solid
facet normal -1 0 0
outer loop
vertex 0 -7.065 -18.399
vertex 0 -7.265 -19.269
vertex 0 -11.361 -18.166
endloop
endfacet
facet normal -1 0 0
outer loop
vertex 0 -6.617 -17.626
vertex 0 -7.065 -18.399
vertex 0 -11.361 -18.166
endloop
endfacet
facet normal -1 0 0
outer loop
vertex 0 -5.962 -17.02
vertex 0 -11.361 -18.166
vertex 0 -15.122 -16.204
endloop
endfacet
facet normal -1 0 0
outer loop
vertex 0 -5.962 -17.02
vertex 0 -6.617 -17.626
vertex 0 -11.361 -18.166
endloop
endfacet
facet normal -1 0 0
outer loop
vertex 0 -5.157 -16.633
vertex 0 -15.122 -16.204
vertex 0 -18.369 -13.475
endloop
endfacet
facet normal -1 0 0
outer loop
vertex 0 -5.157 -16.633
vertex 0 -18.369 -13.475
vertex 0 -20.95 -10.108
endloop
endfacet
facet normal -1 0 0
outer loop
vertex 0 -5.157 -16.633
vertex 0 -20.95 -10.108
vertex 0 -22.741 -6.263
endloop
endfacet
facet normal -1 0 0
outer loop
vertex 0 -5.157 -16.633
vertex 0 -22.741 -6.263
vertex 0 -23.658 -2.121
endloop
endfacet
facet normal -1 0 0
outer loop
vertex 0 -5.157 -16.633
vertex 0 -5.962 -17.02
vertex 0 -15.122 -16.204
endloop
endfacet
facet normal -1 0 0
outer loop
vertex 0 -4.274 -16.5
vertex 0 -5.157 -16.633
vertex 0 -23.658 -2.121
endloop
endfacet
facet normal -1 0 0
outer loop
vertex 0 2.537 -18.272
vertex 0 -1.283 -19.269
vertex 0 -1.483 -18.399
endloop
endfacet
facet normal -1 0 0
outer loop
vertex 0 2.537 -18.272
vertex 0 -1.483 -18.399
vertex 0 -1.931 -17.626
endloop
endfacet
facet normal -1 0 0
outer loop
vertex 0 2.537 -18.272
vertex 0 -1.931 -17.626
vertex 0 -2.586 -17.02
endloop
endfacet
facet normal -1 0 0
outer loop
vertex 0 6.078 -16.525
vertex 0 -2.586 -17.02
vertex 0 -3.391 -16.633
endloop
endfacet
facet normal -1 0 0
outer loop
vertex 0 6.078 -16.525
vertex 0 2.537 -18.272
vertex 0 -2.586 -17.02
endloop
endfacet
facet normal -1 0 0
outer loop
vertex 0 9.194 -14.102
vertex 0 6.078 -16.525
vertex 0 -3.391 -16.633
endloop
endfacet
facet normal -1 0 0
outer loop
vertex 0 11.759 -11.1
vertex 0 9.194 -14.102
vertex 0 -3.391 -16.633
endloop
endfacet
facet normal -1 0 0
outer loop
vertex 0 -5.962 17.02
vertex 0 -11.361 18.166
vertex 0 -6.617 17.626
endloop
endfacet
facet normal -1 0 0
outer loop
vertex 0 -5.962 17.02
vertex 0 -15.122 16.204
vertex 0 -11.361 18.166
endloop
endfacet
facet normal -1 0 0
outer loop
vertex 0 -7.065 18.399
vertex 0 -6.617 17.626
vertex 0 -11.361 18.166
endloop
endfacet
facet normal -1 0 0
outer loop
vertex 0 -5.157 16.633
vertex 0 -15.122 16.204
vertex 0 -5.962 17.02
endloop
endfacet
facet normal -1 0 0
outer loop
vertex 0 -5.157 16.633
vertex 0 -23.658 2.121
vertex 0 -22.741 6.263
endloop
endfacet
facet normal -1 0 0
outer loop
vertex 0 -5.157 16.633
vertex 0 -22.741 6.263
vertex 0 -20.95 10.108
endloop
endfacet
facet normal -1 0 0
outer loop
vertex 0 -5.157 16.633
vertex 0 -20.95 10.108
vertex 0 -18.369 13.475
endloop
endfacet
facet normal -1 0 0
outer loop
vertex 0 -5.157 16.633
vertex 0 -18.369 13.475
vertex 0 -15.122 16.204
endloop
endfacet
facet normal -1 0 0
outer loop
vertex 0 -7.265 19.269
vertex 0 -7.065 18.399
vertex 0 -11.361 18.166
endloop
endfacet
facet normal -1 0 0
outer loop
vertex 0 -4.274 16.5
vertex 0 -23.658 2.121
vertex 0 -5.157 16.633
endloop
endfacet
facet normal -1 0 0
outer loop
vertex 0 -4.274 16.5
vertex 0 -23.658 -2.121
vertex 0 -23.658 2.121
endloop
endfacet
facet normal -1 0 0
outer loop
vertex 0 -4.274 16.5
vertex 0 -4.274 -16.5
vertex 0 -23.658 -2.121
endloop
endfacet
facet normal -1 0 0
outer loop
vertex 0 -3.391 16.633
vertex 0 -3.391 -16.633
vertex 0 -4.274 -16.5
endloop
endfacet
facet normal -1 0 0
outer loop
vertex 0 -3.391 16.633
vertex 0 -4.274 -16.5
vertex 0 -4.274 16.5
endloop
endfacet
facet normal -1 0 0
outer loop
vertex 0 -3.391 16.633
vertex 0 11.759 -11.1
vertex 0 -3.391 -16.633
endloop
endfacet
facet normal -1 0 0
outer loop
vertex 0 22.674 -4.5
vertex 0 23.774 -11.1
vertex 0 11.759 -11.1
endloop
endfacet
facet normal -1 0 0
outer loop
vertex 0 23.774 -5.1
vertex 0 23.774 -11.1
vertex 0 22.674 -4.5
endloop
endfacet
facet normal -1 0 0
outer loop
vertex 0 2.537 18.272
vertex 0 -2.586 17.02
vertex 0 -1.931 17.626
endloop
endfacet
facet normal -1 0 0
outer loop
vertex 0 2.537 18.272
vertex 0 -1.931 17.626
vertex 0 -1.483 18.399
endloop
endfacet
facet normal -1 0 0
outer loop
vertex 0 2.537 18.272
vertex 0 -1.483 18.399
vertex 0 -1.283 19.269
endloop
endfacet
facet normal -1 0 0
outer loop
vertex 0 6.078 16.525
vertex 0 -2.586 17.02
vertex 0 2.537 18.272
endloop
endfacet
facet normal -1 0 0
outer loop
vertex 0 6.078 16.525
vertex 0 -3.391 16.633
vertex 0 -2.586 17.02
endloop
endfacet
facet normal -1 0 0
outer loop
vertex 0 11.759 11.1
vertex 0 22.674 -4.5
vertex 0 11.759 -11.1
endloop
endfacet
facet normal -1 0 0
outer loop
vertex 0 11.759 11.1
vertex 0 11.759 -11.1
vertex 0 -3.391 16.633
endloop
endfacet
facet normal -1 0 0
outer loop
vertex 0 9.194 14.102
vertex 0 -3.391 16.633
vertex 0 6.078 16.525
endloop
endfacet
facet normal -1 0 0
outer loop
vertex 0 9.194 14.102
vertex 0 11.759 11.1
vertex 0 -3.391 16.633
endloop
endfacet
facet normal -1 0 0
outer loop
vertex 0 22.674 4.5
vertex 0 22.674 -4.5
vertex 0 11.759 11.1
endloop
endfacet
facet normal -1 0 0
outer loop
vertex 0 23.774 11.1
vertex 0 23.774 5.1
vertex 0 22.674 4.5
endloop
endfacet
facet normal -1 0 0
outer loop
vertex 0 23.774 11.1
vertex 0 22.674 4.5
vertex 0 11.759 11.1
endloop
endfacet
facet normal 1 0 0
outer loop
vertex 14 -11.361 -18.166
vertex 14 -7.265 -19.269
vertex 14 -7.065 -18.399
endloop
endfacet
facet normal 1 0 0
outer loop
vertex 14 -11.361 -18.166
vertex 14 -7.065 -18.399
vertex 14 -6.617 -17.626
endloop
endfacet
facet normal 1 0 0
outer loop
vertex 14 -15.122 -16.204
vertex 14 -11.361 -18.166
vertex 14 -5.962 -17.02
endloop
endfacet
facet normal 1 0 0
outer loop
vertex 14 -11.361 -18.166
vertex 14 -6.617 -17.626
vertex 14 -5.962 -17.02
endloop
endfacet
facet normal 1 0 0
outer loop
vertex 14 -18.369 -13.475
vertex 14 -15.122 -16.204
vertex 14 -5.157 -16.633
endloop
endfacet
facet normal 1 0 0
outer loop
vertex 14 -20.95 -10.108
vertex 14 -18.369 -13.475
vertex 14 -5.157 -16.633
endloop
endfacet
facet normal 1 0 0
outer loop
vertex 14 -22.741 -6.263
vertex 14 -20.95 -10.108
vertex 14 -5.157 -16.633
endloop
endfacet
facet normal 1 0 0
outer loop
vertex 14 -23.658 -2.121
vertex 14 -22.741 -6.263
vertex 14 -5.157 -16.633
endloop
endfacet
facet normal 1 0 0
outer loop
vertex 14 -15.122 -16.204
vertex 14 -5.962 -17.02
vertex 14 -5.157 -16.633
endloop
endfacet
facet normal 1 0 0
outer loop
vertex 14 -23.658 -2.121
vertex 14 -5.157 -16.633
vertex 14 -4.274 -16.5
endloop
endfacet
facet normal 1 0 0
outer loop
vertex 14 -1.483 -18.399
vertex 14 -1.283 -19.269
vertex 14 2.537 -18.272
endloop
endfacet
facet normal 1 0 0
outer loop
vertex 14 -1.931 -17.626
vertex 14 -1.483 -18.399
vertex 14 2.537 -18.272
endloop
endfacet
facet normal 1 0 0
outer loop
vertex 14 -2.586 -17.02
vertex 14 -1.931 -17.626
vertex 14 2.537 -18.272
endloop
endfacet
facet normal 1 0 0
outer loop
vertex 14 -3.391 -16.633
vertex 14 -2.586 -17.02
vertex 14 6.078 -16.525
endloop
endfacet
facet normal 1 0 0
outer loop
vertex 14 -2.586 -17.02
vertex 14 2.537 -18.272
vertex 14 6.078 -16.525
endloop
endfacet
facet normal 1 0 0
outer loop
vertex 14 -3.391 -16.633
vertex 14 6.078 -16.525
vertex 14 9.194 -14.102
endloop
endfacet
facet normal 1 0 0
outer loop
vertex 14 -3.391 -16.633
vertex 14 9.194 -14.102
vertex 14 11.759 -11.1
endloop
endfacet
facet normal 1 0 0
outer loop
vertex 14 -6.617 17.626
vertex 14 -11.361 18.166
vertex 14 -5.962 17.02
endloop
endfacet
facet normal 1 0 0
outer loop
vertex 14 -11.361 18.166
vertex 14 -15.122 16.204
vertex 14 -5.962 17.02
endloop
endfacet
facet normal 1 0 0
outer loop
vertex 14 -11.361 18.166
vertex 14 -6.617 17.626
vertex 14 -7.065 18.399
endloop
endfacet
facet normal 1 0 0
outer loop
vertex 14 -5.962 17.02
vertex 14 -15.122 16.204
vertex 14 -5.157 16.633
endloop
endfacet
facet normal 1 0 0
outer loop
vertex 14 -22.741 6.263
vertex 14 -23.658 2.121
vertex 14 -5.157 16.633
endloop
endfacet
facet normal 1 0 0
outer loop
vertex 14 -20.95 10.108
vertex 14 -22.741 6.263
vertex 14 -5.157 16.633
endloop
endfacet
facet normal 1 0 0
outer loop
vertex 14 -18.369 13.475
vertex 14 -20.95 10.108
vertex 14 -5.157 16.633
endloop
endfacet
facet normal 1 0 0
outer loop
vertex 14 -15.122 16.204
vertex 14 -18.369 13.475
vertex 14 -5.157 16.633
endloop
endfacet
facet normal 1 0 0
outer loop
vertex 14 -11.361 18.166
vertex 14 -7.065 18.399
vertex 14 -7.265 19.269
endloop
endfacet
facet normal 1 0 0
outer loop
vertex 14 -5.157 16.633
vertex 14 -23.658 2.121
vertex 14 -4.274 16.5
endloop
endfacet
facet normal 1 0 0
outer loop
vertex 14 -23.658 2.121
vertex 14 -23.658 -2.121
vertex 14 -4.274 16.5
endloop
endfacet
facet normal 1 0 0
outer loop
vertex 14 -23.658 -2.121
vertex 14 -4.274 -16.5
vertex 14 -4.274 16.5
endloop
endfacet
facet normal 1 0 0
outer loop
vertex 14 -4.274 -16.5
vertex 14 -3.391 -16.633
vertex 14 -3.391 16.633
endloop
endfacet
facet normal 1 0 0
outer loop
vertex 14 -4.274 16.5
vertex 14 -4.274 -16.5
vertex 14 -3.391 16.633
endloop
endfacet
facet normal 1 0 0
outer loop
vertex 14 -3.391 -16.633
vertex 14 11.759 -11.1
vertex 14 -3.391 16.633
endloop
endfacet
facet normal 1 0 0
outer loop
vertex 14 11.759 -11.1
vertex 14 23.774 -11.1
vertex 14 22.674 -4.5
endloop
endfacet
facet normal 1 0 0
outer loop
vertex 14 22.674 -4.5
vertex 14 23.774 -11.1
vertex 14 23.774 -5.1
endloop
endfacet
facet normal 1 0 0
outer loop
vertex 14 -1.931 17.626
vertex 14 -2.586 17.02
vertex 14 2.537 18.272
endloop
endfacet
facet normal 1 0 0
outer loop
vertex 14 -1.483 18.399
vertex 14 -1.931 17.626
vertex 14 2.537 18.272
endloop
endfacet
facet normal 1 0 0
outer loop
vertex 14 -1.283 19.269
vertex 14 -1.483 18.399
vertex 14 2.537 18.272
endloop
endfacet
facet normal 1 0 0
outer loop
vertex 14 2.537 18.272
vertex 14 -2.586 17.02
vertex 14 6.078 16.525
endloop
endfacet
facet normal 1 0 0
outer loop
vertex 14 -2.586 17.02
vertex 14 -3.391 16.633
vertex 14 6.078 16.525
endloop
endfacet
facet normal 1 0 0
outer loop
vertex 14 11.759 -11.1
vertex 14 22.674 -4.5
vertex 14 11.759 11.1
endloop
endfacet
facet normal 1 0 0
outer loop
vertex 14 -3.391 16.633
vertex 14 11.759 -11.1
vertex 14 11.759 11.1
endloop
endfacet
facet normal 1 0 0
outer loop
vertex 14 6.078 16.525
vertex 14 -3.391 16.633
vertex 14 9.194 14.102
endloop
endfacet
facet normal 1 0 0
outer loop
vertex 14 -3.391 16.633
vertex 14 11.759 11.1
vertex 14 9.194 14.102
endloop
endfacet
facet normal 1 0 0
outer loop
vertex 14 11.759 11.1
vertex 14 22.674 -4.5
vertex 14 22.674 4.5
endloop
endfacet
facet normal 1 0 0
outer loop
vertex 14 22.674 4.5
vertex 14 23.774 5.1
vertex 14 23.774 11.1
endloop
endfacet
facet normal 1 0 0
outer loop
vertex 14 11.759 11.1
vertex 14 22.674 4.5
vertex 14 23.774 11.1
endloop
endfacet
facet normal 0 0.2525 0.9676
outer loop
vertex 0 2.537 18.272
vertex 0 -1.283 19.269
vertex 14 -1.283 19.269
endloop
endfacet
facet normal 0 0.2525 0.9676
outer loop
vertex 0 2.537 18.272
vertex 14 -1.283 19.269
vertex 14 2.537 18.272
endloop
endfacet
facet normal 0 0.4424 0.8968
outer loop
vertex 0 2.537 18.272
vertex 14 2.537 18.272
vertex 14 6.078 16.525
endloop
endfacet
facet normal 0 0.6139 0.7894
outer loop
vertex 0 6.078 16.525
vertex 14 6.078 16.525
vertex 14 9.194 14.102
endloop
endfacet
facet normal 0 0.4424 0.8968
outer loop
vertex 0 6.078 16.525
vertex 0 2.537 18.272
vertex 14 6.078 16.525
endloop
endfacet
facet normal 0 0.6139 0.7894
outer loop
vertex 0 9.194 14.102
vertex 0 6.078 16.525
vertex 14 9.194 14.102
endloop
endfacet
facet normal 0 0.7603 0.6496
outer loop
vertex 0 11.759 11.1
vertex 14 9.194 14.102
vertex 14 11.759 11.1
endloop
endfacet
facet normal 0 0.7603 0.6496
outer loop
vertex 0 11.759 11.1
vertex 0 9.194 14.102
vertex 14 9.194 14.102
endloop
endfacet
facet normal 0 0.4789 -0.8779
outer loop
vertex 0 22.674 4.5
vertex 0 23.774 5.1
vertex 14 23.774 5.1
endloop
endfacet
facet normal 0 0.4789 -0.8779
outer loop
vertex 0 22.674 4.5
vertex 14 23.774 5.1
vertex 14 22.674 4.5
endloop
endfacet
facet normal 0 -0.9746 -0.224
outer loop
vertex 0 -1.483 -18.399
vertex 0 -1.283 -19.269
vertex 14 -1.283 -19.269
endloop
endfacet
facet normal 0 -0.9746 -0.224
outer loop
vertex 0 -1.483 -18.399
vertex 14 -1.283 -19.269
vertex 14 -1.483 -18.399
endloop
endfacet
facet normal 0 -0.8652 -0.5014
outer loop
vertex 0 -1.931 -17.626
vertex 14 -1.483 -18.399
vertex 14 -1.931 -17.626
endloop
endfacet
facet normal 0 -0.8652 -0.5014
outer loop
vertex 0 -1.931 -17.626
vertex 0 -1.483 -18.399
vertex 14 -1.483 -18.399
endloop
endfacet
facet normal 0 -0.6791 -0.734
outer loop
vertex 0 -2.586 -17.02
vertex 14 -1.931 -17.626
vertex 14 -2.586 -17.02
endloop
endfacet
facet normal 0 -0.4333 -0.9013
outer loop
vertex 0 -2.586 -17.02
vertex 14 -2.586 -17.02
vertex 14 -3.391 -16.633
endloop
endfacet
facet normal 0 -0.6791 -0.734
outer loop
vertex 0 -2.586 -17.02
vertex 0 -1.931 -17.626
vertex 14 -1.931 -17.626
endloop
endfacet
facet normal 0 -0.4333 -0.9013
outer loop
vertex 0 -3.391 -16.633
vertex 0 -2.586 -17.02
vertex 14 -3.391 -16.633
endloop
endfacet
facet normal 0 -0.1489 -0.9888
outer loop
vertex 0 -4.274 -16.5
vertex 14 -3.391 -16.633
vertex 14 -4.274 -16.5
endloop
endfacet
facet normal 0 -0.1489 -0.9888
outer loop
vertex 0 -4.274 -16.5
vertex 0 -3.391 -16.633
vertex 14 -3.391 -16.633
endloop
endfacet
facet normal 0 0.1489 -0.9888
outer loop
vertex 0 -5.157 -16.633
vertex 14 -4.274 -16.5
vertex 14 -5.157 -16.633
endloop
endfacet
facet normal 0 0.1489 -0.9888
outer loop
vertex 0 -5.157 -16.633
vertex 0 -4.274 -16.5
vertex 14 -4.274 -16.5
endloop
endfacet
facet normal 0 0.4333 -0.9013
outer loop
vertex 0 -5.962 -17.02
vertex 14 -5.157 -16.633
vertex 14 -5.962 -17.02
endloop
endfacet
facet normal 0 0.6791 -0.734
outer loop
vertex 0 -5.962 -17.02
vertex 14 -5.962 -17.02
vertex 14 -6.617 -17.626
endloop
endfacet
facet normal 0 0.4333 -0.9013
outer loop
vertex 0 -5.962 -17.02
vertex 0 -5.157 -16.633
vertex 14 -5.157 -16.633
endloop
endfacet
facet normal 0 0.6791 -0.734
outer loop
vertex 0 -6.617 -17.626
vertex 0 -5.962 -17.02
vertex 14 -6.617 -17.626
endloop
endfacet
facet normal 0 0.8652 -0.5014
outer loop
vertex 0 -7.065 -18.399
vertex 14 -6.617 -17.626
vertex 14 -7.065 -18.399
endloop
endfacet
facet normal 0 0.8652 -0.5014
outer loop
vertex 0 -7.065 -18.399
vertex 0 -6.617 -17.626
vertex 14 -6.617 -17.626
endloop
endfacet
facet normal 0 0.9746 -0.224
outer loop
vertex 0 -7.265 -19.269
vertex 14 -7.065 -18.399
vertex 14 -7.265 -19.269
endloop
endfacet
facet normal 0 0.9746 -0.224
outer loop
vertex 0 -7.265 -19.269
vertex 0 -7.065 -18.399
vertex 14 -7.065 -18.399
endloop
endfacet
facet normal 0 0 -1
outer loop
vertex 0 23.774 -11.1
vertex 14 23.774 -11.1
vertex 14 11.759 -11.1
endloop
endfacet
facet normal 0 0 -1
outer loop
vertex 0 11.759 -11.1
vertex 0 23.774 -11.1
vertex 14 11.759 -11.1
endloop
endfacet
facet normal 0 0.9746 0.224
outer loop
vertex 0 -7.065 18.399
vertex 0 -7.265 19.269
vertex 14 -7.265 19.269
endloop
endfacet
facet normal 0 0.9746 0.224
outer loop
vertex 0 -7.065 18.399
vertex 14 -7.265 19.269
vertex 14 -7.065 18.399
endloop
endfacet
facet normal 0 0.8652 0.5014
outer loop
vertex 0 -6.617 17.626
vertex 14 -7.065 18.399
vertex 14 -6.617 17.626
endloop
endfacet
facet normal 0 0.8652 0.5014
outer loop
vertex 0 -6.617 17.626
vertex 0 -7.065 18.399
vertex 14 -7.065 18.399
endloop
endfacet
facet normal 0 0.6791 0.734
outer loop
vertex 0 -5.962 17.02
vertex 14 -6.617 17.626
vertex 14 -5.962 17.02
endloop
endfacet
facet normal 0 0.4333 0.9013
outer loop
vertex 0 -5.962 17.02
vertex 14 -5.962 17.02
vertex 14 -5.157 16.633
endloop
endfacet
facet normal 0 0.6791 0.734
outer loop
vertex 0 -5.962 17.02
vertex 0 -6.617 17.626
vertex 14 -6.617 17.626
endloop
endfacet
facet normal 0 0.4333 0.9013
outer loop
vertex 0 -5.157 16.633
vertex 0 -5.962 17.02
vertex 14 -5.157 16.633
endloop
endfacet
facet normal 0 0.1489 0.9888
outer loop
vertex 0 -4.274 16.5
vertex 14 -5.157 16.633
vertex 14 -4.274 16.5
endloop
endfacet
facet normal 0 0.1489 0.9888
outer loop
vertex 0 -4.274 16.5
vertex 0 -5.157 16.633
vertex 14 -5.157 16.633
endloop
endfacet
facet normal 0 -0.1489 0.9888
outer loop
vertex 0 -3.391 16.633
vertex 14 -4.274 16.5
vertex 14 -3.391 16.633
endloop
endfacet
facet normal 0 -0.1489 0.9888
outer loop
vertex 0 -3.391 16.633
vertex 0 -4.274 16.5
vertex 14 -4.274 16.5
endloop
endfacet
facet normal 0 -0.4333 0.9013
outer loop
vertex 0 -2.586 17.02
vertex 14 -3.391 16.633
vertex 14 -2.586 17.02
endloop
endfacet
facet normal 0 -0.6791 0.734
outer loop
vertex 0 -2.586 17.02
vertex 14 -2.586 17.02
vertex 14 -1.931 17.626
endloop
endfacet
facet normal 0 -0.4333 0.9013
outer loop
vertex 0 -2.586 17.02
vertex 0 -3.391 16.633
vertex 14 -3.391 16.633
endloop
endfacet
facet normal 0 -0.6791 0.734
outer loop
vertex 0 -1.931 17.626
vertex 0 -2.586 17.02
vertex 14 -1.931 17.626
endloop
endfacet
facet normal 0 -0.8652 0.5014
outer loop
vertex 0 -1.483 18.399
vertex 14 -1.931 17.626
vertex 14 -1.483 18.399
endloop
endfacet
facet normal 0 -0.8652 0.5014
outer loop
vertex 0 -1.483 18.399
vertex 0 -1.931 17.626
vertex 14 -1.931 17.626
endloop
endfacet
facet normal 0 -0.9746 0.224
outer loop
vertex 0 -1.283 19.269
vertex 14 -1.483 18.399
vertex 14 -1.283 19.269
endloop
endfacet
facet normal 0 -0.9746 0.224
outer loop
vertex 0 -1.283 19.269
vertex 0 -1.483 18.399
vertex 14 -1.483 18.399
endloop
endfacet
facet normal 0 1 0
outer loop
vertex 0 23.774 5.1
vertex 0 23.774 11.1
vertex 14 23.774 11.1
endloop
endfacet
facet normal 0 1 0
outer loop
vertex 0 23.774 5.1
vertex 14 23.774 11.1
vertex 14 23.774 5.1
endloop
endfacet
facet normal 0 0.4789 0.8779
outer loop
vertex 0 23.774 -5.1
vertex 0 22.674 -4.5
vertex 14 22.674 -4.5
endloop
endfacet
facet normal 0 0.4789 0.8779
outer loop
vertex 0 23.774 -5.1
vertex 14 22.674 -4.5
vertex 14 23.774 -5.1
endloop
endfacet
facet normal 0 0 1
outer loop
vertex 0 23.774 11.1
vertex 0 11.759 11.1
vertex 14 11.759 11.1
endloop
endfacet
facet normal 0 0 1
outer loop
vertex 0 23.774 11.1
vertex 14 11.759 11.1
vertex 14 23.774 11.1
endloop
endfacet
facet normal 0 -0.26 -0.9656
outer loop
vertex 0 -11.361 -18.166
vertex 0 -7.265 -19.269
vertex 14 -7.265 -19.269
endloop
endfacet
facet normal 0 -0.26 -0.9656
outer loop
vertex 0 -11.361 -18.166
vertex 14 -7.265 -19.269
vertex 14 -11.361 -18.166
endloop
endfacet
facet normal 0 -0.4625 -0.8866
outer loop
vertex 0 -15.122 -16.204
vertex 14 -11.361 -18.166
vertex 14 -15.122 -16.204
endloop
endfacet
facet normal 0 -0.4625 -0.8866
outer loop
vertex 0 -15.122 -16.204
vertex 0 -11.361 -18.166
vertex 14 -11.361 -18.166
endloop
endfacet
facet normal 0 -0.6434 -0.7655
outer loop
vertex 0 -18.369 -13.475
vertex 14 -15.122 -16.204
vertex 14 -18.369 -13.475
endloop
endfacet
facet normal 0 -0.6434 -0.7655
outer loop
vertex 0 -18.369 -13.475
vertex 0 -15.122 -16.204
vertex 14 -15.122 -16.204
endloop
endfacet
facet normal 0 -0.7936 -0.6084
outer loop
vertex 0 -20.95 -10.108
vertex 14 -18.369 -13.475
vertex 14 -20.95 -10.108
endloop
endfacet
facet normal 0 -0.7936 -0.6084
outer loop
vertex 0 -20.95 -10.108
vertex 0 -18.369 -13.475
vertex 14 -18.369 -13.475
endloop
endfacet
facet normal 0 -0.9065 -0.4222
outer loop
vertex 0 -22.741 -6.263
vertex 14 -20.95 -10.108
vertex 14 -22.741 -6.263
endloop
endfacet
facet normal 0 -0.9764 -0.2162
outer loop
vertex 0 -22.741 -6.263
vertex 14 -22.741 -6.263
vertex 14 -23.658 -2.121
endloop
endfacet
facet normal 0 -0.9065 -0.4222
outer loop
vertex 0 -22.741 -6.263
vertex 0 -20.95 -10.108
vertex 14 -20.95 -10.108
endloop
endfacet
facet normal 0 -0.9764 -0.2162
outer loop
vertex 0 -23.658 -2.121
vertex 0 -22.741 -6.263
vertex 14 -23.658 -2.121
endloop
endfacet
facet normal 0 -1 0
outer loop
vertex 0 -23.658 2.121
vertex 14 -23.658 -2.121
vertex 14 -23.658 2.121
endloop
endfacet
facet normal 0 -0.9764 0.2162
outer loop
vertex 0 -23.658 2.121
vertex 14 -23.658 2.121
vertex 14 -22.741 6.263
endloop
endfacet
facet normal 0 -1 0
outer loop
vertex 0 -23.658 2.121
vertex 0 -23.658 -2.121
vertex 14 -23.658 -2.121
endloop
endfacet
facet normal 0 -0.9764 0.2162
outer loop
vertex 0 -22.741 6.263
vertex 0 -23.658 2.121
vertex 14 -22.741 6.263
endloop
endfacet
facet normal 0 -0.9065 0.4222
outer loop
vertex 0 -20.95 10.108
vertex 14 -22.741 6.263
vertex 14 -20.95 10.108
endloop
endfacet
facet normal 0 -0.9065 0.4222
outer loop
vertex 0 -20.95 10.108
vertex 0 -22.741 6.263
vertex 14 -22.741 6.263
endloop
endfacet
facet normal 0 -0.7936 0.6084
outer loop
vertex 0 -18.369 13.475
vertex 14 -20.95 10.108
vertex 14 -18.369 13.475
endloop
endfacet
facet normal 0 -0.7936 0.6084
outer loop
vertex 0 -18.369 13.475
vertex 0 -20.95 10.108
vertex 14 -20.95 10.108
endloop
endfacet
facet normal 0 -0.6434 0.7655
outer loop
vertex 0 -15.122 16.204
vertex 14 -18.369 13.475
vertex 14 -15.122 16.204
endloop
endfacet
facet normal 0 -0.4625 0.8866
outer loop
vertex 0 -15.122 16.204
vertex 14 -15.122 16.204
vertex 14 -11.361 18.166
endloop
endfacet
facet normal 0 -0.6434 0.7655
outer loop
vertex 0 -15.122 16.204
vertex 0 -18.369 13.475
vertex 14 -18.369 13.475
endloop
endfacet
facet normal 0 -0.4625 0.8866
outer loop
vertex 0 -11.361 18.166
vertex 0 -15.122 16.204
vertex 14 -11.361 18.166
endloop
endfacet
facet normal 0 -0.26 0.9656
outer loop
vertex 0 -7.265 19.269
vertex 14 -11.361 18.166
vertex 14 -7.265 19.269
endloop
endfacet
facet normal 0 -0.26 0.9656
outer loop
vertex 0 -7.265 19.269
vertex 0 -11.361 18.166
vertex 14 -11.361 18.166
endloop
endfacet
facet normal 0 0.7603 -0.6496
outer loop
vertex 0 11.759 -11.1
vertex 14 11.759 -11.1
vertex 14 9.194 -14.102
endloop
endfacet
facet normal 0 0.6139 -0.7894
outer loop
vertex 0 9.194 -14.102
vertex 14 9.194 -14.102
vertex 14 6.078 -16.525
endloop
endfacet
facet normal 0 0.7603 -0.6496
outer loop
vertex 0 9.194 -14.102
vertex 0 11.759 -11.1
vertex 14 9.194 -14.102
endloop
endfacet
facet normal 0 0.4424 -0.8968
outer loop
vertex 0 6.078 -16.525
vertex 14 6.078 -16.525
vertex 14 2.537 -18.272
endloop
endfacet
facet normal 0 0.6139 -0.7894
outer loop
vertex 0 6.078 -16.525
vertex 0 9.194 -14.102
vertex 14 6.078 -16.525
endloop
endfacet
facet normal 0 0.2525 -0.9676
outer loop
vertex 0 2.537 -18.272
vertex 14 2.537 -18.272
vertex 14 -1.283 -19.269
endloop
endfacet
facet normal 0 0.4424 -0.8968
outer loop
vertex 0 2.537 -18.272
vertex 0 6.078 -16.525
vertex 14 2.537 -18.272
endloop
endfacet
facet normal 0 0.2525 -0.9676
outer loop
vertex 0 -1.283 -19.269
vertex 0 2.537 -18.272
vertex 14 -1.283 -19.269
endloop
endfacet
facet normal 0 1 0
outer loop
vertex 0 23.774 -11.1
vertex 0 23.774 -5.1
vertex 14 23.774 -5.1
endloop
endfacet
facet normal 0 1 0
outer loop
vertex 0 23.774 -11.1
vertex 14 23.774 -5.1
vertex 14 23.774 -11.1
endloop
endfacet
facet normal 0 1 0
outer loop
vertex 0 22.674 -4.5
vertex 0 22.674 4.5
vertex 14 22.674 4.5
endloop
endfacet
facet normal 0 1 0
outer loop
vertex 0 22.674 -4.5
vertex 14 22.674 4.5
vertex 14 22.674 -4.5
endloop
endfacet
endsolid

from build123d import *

# Parameters (mm, degrees)
BOSS_EXTRUDE1_DEPTH = 14


with BuildPart() as part:
    # Sketch1 → Boss-Extrude1 (new body)
    with BuildSketch(Plane(origin=(0, 0, 0), x_dir=(0, 0, -1), z_dir=(1, 0, 0))):
        with BuildLine():
            Line((-4.5, 22.673860989), (4.5, 22.673860989))
            Line((4.5, 22.673860989), (5.1, 23.773860989))
            Line((5.1, 23.773860989), (11.1, 23.773860989))
            Line((11.1, 23.773860989), (11.1, 11.75860607))
            ThreePointArc((11.1, 11.75860607), (16.525488971, 6.077864194), (19.269230769, -1.282749897))
            ThreePointArc((19.269230769, -1.282749897), (16.5, -4.273860989), (19.269230769, -7.26497208))
            ThreePointArc((19.269230769, -7.26497208), (0, -23.773860989), (-19.269230769, -7.26497208))
            ThreePointArc((-19.269230769, -7.26497208), (-16.5, -4.273860989), (-19.269230769, -1.282749897))
            ThreePointArc((-19.269230769, -1.282749897), (-16.525488971, 6.077864194), (-11.1, 11.75860607))
            Line((-11.1, 11.75860607), (-11.1, 23.773860989))
            Line((-11.1, 23.773860989), (-5.1, 23.773860989))
            Line((-5.1, 23.773860989), (-4.5, 22.673860989))
        make_face()
    extrude(amount=BOSS_EXTRUDE1_DEPTH)


solid = part.part
